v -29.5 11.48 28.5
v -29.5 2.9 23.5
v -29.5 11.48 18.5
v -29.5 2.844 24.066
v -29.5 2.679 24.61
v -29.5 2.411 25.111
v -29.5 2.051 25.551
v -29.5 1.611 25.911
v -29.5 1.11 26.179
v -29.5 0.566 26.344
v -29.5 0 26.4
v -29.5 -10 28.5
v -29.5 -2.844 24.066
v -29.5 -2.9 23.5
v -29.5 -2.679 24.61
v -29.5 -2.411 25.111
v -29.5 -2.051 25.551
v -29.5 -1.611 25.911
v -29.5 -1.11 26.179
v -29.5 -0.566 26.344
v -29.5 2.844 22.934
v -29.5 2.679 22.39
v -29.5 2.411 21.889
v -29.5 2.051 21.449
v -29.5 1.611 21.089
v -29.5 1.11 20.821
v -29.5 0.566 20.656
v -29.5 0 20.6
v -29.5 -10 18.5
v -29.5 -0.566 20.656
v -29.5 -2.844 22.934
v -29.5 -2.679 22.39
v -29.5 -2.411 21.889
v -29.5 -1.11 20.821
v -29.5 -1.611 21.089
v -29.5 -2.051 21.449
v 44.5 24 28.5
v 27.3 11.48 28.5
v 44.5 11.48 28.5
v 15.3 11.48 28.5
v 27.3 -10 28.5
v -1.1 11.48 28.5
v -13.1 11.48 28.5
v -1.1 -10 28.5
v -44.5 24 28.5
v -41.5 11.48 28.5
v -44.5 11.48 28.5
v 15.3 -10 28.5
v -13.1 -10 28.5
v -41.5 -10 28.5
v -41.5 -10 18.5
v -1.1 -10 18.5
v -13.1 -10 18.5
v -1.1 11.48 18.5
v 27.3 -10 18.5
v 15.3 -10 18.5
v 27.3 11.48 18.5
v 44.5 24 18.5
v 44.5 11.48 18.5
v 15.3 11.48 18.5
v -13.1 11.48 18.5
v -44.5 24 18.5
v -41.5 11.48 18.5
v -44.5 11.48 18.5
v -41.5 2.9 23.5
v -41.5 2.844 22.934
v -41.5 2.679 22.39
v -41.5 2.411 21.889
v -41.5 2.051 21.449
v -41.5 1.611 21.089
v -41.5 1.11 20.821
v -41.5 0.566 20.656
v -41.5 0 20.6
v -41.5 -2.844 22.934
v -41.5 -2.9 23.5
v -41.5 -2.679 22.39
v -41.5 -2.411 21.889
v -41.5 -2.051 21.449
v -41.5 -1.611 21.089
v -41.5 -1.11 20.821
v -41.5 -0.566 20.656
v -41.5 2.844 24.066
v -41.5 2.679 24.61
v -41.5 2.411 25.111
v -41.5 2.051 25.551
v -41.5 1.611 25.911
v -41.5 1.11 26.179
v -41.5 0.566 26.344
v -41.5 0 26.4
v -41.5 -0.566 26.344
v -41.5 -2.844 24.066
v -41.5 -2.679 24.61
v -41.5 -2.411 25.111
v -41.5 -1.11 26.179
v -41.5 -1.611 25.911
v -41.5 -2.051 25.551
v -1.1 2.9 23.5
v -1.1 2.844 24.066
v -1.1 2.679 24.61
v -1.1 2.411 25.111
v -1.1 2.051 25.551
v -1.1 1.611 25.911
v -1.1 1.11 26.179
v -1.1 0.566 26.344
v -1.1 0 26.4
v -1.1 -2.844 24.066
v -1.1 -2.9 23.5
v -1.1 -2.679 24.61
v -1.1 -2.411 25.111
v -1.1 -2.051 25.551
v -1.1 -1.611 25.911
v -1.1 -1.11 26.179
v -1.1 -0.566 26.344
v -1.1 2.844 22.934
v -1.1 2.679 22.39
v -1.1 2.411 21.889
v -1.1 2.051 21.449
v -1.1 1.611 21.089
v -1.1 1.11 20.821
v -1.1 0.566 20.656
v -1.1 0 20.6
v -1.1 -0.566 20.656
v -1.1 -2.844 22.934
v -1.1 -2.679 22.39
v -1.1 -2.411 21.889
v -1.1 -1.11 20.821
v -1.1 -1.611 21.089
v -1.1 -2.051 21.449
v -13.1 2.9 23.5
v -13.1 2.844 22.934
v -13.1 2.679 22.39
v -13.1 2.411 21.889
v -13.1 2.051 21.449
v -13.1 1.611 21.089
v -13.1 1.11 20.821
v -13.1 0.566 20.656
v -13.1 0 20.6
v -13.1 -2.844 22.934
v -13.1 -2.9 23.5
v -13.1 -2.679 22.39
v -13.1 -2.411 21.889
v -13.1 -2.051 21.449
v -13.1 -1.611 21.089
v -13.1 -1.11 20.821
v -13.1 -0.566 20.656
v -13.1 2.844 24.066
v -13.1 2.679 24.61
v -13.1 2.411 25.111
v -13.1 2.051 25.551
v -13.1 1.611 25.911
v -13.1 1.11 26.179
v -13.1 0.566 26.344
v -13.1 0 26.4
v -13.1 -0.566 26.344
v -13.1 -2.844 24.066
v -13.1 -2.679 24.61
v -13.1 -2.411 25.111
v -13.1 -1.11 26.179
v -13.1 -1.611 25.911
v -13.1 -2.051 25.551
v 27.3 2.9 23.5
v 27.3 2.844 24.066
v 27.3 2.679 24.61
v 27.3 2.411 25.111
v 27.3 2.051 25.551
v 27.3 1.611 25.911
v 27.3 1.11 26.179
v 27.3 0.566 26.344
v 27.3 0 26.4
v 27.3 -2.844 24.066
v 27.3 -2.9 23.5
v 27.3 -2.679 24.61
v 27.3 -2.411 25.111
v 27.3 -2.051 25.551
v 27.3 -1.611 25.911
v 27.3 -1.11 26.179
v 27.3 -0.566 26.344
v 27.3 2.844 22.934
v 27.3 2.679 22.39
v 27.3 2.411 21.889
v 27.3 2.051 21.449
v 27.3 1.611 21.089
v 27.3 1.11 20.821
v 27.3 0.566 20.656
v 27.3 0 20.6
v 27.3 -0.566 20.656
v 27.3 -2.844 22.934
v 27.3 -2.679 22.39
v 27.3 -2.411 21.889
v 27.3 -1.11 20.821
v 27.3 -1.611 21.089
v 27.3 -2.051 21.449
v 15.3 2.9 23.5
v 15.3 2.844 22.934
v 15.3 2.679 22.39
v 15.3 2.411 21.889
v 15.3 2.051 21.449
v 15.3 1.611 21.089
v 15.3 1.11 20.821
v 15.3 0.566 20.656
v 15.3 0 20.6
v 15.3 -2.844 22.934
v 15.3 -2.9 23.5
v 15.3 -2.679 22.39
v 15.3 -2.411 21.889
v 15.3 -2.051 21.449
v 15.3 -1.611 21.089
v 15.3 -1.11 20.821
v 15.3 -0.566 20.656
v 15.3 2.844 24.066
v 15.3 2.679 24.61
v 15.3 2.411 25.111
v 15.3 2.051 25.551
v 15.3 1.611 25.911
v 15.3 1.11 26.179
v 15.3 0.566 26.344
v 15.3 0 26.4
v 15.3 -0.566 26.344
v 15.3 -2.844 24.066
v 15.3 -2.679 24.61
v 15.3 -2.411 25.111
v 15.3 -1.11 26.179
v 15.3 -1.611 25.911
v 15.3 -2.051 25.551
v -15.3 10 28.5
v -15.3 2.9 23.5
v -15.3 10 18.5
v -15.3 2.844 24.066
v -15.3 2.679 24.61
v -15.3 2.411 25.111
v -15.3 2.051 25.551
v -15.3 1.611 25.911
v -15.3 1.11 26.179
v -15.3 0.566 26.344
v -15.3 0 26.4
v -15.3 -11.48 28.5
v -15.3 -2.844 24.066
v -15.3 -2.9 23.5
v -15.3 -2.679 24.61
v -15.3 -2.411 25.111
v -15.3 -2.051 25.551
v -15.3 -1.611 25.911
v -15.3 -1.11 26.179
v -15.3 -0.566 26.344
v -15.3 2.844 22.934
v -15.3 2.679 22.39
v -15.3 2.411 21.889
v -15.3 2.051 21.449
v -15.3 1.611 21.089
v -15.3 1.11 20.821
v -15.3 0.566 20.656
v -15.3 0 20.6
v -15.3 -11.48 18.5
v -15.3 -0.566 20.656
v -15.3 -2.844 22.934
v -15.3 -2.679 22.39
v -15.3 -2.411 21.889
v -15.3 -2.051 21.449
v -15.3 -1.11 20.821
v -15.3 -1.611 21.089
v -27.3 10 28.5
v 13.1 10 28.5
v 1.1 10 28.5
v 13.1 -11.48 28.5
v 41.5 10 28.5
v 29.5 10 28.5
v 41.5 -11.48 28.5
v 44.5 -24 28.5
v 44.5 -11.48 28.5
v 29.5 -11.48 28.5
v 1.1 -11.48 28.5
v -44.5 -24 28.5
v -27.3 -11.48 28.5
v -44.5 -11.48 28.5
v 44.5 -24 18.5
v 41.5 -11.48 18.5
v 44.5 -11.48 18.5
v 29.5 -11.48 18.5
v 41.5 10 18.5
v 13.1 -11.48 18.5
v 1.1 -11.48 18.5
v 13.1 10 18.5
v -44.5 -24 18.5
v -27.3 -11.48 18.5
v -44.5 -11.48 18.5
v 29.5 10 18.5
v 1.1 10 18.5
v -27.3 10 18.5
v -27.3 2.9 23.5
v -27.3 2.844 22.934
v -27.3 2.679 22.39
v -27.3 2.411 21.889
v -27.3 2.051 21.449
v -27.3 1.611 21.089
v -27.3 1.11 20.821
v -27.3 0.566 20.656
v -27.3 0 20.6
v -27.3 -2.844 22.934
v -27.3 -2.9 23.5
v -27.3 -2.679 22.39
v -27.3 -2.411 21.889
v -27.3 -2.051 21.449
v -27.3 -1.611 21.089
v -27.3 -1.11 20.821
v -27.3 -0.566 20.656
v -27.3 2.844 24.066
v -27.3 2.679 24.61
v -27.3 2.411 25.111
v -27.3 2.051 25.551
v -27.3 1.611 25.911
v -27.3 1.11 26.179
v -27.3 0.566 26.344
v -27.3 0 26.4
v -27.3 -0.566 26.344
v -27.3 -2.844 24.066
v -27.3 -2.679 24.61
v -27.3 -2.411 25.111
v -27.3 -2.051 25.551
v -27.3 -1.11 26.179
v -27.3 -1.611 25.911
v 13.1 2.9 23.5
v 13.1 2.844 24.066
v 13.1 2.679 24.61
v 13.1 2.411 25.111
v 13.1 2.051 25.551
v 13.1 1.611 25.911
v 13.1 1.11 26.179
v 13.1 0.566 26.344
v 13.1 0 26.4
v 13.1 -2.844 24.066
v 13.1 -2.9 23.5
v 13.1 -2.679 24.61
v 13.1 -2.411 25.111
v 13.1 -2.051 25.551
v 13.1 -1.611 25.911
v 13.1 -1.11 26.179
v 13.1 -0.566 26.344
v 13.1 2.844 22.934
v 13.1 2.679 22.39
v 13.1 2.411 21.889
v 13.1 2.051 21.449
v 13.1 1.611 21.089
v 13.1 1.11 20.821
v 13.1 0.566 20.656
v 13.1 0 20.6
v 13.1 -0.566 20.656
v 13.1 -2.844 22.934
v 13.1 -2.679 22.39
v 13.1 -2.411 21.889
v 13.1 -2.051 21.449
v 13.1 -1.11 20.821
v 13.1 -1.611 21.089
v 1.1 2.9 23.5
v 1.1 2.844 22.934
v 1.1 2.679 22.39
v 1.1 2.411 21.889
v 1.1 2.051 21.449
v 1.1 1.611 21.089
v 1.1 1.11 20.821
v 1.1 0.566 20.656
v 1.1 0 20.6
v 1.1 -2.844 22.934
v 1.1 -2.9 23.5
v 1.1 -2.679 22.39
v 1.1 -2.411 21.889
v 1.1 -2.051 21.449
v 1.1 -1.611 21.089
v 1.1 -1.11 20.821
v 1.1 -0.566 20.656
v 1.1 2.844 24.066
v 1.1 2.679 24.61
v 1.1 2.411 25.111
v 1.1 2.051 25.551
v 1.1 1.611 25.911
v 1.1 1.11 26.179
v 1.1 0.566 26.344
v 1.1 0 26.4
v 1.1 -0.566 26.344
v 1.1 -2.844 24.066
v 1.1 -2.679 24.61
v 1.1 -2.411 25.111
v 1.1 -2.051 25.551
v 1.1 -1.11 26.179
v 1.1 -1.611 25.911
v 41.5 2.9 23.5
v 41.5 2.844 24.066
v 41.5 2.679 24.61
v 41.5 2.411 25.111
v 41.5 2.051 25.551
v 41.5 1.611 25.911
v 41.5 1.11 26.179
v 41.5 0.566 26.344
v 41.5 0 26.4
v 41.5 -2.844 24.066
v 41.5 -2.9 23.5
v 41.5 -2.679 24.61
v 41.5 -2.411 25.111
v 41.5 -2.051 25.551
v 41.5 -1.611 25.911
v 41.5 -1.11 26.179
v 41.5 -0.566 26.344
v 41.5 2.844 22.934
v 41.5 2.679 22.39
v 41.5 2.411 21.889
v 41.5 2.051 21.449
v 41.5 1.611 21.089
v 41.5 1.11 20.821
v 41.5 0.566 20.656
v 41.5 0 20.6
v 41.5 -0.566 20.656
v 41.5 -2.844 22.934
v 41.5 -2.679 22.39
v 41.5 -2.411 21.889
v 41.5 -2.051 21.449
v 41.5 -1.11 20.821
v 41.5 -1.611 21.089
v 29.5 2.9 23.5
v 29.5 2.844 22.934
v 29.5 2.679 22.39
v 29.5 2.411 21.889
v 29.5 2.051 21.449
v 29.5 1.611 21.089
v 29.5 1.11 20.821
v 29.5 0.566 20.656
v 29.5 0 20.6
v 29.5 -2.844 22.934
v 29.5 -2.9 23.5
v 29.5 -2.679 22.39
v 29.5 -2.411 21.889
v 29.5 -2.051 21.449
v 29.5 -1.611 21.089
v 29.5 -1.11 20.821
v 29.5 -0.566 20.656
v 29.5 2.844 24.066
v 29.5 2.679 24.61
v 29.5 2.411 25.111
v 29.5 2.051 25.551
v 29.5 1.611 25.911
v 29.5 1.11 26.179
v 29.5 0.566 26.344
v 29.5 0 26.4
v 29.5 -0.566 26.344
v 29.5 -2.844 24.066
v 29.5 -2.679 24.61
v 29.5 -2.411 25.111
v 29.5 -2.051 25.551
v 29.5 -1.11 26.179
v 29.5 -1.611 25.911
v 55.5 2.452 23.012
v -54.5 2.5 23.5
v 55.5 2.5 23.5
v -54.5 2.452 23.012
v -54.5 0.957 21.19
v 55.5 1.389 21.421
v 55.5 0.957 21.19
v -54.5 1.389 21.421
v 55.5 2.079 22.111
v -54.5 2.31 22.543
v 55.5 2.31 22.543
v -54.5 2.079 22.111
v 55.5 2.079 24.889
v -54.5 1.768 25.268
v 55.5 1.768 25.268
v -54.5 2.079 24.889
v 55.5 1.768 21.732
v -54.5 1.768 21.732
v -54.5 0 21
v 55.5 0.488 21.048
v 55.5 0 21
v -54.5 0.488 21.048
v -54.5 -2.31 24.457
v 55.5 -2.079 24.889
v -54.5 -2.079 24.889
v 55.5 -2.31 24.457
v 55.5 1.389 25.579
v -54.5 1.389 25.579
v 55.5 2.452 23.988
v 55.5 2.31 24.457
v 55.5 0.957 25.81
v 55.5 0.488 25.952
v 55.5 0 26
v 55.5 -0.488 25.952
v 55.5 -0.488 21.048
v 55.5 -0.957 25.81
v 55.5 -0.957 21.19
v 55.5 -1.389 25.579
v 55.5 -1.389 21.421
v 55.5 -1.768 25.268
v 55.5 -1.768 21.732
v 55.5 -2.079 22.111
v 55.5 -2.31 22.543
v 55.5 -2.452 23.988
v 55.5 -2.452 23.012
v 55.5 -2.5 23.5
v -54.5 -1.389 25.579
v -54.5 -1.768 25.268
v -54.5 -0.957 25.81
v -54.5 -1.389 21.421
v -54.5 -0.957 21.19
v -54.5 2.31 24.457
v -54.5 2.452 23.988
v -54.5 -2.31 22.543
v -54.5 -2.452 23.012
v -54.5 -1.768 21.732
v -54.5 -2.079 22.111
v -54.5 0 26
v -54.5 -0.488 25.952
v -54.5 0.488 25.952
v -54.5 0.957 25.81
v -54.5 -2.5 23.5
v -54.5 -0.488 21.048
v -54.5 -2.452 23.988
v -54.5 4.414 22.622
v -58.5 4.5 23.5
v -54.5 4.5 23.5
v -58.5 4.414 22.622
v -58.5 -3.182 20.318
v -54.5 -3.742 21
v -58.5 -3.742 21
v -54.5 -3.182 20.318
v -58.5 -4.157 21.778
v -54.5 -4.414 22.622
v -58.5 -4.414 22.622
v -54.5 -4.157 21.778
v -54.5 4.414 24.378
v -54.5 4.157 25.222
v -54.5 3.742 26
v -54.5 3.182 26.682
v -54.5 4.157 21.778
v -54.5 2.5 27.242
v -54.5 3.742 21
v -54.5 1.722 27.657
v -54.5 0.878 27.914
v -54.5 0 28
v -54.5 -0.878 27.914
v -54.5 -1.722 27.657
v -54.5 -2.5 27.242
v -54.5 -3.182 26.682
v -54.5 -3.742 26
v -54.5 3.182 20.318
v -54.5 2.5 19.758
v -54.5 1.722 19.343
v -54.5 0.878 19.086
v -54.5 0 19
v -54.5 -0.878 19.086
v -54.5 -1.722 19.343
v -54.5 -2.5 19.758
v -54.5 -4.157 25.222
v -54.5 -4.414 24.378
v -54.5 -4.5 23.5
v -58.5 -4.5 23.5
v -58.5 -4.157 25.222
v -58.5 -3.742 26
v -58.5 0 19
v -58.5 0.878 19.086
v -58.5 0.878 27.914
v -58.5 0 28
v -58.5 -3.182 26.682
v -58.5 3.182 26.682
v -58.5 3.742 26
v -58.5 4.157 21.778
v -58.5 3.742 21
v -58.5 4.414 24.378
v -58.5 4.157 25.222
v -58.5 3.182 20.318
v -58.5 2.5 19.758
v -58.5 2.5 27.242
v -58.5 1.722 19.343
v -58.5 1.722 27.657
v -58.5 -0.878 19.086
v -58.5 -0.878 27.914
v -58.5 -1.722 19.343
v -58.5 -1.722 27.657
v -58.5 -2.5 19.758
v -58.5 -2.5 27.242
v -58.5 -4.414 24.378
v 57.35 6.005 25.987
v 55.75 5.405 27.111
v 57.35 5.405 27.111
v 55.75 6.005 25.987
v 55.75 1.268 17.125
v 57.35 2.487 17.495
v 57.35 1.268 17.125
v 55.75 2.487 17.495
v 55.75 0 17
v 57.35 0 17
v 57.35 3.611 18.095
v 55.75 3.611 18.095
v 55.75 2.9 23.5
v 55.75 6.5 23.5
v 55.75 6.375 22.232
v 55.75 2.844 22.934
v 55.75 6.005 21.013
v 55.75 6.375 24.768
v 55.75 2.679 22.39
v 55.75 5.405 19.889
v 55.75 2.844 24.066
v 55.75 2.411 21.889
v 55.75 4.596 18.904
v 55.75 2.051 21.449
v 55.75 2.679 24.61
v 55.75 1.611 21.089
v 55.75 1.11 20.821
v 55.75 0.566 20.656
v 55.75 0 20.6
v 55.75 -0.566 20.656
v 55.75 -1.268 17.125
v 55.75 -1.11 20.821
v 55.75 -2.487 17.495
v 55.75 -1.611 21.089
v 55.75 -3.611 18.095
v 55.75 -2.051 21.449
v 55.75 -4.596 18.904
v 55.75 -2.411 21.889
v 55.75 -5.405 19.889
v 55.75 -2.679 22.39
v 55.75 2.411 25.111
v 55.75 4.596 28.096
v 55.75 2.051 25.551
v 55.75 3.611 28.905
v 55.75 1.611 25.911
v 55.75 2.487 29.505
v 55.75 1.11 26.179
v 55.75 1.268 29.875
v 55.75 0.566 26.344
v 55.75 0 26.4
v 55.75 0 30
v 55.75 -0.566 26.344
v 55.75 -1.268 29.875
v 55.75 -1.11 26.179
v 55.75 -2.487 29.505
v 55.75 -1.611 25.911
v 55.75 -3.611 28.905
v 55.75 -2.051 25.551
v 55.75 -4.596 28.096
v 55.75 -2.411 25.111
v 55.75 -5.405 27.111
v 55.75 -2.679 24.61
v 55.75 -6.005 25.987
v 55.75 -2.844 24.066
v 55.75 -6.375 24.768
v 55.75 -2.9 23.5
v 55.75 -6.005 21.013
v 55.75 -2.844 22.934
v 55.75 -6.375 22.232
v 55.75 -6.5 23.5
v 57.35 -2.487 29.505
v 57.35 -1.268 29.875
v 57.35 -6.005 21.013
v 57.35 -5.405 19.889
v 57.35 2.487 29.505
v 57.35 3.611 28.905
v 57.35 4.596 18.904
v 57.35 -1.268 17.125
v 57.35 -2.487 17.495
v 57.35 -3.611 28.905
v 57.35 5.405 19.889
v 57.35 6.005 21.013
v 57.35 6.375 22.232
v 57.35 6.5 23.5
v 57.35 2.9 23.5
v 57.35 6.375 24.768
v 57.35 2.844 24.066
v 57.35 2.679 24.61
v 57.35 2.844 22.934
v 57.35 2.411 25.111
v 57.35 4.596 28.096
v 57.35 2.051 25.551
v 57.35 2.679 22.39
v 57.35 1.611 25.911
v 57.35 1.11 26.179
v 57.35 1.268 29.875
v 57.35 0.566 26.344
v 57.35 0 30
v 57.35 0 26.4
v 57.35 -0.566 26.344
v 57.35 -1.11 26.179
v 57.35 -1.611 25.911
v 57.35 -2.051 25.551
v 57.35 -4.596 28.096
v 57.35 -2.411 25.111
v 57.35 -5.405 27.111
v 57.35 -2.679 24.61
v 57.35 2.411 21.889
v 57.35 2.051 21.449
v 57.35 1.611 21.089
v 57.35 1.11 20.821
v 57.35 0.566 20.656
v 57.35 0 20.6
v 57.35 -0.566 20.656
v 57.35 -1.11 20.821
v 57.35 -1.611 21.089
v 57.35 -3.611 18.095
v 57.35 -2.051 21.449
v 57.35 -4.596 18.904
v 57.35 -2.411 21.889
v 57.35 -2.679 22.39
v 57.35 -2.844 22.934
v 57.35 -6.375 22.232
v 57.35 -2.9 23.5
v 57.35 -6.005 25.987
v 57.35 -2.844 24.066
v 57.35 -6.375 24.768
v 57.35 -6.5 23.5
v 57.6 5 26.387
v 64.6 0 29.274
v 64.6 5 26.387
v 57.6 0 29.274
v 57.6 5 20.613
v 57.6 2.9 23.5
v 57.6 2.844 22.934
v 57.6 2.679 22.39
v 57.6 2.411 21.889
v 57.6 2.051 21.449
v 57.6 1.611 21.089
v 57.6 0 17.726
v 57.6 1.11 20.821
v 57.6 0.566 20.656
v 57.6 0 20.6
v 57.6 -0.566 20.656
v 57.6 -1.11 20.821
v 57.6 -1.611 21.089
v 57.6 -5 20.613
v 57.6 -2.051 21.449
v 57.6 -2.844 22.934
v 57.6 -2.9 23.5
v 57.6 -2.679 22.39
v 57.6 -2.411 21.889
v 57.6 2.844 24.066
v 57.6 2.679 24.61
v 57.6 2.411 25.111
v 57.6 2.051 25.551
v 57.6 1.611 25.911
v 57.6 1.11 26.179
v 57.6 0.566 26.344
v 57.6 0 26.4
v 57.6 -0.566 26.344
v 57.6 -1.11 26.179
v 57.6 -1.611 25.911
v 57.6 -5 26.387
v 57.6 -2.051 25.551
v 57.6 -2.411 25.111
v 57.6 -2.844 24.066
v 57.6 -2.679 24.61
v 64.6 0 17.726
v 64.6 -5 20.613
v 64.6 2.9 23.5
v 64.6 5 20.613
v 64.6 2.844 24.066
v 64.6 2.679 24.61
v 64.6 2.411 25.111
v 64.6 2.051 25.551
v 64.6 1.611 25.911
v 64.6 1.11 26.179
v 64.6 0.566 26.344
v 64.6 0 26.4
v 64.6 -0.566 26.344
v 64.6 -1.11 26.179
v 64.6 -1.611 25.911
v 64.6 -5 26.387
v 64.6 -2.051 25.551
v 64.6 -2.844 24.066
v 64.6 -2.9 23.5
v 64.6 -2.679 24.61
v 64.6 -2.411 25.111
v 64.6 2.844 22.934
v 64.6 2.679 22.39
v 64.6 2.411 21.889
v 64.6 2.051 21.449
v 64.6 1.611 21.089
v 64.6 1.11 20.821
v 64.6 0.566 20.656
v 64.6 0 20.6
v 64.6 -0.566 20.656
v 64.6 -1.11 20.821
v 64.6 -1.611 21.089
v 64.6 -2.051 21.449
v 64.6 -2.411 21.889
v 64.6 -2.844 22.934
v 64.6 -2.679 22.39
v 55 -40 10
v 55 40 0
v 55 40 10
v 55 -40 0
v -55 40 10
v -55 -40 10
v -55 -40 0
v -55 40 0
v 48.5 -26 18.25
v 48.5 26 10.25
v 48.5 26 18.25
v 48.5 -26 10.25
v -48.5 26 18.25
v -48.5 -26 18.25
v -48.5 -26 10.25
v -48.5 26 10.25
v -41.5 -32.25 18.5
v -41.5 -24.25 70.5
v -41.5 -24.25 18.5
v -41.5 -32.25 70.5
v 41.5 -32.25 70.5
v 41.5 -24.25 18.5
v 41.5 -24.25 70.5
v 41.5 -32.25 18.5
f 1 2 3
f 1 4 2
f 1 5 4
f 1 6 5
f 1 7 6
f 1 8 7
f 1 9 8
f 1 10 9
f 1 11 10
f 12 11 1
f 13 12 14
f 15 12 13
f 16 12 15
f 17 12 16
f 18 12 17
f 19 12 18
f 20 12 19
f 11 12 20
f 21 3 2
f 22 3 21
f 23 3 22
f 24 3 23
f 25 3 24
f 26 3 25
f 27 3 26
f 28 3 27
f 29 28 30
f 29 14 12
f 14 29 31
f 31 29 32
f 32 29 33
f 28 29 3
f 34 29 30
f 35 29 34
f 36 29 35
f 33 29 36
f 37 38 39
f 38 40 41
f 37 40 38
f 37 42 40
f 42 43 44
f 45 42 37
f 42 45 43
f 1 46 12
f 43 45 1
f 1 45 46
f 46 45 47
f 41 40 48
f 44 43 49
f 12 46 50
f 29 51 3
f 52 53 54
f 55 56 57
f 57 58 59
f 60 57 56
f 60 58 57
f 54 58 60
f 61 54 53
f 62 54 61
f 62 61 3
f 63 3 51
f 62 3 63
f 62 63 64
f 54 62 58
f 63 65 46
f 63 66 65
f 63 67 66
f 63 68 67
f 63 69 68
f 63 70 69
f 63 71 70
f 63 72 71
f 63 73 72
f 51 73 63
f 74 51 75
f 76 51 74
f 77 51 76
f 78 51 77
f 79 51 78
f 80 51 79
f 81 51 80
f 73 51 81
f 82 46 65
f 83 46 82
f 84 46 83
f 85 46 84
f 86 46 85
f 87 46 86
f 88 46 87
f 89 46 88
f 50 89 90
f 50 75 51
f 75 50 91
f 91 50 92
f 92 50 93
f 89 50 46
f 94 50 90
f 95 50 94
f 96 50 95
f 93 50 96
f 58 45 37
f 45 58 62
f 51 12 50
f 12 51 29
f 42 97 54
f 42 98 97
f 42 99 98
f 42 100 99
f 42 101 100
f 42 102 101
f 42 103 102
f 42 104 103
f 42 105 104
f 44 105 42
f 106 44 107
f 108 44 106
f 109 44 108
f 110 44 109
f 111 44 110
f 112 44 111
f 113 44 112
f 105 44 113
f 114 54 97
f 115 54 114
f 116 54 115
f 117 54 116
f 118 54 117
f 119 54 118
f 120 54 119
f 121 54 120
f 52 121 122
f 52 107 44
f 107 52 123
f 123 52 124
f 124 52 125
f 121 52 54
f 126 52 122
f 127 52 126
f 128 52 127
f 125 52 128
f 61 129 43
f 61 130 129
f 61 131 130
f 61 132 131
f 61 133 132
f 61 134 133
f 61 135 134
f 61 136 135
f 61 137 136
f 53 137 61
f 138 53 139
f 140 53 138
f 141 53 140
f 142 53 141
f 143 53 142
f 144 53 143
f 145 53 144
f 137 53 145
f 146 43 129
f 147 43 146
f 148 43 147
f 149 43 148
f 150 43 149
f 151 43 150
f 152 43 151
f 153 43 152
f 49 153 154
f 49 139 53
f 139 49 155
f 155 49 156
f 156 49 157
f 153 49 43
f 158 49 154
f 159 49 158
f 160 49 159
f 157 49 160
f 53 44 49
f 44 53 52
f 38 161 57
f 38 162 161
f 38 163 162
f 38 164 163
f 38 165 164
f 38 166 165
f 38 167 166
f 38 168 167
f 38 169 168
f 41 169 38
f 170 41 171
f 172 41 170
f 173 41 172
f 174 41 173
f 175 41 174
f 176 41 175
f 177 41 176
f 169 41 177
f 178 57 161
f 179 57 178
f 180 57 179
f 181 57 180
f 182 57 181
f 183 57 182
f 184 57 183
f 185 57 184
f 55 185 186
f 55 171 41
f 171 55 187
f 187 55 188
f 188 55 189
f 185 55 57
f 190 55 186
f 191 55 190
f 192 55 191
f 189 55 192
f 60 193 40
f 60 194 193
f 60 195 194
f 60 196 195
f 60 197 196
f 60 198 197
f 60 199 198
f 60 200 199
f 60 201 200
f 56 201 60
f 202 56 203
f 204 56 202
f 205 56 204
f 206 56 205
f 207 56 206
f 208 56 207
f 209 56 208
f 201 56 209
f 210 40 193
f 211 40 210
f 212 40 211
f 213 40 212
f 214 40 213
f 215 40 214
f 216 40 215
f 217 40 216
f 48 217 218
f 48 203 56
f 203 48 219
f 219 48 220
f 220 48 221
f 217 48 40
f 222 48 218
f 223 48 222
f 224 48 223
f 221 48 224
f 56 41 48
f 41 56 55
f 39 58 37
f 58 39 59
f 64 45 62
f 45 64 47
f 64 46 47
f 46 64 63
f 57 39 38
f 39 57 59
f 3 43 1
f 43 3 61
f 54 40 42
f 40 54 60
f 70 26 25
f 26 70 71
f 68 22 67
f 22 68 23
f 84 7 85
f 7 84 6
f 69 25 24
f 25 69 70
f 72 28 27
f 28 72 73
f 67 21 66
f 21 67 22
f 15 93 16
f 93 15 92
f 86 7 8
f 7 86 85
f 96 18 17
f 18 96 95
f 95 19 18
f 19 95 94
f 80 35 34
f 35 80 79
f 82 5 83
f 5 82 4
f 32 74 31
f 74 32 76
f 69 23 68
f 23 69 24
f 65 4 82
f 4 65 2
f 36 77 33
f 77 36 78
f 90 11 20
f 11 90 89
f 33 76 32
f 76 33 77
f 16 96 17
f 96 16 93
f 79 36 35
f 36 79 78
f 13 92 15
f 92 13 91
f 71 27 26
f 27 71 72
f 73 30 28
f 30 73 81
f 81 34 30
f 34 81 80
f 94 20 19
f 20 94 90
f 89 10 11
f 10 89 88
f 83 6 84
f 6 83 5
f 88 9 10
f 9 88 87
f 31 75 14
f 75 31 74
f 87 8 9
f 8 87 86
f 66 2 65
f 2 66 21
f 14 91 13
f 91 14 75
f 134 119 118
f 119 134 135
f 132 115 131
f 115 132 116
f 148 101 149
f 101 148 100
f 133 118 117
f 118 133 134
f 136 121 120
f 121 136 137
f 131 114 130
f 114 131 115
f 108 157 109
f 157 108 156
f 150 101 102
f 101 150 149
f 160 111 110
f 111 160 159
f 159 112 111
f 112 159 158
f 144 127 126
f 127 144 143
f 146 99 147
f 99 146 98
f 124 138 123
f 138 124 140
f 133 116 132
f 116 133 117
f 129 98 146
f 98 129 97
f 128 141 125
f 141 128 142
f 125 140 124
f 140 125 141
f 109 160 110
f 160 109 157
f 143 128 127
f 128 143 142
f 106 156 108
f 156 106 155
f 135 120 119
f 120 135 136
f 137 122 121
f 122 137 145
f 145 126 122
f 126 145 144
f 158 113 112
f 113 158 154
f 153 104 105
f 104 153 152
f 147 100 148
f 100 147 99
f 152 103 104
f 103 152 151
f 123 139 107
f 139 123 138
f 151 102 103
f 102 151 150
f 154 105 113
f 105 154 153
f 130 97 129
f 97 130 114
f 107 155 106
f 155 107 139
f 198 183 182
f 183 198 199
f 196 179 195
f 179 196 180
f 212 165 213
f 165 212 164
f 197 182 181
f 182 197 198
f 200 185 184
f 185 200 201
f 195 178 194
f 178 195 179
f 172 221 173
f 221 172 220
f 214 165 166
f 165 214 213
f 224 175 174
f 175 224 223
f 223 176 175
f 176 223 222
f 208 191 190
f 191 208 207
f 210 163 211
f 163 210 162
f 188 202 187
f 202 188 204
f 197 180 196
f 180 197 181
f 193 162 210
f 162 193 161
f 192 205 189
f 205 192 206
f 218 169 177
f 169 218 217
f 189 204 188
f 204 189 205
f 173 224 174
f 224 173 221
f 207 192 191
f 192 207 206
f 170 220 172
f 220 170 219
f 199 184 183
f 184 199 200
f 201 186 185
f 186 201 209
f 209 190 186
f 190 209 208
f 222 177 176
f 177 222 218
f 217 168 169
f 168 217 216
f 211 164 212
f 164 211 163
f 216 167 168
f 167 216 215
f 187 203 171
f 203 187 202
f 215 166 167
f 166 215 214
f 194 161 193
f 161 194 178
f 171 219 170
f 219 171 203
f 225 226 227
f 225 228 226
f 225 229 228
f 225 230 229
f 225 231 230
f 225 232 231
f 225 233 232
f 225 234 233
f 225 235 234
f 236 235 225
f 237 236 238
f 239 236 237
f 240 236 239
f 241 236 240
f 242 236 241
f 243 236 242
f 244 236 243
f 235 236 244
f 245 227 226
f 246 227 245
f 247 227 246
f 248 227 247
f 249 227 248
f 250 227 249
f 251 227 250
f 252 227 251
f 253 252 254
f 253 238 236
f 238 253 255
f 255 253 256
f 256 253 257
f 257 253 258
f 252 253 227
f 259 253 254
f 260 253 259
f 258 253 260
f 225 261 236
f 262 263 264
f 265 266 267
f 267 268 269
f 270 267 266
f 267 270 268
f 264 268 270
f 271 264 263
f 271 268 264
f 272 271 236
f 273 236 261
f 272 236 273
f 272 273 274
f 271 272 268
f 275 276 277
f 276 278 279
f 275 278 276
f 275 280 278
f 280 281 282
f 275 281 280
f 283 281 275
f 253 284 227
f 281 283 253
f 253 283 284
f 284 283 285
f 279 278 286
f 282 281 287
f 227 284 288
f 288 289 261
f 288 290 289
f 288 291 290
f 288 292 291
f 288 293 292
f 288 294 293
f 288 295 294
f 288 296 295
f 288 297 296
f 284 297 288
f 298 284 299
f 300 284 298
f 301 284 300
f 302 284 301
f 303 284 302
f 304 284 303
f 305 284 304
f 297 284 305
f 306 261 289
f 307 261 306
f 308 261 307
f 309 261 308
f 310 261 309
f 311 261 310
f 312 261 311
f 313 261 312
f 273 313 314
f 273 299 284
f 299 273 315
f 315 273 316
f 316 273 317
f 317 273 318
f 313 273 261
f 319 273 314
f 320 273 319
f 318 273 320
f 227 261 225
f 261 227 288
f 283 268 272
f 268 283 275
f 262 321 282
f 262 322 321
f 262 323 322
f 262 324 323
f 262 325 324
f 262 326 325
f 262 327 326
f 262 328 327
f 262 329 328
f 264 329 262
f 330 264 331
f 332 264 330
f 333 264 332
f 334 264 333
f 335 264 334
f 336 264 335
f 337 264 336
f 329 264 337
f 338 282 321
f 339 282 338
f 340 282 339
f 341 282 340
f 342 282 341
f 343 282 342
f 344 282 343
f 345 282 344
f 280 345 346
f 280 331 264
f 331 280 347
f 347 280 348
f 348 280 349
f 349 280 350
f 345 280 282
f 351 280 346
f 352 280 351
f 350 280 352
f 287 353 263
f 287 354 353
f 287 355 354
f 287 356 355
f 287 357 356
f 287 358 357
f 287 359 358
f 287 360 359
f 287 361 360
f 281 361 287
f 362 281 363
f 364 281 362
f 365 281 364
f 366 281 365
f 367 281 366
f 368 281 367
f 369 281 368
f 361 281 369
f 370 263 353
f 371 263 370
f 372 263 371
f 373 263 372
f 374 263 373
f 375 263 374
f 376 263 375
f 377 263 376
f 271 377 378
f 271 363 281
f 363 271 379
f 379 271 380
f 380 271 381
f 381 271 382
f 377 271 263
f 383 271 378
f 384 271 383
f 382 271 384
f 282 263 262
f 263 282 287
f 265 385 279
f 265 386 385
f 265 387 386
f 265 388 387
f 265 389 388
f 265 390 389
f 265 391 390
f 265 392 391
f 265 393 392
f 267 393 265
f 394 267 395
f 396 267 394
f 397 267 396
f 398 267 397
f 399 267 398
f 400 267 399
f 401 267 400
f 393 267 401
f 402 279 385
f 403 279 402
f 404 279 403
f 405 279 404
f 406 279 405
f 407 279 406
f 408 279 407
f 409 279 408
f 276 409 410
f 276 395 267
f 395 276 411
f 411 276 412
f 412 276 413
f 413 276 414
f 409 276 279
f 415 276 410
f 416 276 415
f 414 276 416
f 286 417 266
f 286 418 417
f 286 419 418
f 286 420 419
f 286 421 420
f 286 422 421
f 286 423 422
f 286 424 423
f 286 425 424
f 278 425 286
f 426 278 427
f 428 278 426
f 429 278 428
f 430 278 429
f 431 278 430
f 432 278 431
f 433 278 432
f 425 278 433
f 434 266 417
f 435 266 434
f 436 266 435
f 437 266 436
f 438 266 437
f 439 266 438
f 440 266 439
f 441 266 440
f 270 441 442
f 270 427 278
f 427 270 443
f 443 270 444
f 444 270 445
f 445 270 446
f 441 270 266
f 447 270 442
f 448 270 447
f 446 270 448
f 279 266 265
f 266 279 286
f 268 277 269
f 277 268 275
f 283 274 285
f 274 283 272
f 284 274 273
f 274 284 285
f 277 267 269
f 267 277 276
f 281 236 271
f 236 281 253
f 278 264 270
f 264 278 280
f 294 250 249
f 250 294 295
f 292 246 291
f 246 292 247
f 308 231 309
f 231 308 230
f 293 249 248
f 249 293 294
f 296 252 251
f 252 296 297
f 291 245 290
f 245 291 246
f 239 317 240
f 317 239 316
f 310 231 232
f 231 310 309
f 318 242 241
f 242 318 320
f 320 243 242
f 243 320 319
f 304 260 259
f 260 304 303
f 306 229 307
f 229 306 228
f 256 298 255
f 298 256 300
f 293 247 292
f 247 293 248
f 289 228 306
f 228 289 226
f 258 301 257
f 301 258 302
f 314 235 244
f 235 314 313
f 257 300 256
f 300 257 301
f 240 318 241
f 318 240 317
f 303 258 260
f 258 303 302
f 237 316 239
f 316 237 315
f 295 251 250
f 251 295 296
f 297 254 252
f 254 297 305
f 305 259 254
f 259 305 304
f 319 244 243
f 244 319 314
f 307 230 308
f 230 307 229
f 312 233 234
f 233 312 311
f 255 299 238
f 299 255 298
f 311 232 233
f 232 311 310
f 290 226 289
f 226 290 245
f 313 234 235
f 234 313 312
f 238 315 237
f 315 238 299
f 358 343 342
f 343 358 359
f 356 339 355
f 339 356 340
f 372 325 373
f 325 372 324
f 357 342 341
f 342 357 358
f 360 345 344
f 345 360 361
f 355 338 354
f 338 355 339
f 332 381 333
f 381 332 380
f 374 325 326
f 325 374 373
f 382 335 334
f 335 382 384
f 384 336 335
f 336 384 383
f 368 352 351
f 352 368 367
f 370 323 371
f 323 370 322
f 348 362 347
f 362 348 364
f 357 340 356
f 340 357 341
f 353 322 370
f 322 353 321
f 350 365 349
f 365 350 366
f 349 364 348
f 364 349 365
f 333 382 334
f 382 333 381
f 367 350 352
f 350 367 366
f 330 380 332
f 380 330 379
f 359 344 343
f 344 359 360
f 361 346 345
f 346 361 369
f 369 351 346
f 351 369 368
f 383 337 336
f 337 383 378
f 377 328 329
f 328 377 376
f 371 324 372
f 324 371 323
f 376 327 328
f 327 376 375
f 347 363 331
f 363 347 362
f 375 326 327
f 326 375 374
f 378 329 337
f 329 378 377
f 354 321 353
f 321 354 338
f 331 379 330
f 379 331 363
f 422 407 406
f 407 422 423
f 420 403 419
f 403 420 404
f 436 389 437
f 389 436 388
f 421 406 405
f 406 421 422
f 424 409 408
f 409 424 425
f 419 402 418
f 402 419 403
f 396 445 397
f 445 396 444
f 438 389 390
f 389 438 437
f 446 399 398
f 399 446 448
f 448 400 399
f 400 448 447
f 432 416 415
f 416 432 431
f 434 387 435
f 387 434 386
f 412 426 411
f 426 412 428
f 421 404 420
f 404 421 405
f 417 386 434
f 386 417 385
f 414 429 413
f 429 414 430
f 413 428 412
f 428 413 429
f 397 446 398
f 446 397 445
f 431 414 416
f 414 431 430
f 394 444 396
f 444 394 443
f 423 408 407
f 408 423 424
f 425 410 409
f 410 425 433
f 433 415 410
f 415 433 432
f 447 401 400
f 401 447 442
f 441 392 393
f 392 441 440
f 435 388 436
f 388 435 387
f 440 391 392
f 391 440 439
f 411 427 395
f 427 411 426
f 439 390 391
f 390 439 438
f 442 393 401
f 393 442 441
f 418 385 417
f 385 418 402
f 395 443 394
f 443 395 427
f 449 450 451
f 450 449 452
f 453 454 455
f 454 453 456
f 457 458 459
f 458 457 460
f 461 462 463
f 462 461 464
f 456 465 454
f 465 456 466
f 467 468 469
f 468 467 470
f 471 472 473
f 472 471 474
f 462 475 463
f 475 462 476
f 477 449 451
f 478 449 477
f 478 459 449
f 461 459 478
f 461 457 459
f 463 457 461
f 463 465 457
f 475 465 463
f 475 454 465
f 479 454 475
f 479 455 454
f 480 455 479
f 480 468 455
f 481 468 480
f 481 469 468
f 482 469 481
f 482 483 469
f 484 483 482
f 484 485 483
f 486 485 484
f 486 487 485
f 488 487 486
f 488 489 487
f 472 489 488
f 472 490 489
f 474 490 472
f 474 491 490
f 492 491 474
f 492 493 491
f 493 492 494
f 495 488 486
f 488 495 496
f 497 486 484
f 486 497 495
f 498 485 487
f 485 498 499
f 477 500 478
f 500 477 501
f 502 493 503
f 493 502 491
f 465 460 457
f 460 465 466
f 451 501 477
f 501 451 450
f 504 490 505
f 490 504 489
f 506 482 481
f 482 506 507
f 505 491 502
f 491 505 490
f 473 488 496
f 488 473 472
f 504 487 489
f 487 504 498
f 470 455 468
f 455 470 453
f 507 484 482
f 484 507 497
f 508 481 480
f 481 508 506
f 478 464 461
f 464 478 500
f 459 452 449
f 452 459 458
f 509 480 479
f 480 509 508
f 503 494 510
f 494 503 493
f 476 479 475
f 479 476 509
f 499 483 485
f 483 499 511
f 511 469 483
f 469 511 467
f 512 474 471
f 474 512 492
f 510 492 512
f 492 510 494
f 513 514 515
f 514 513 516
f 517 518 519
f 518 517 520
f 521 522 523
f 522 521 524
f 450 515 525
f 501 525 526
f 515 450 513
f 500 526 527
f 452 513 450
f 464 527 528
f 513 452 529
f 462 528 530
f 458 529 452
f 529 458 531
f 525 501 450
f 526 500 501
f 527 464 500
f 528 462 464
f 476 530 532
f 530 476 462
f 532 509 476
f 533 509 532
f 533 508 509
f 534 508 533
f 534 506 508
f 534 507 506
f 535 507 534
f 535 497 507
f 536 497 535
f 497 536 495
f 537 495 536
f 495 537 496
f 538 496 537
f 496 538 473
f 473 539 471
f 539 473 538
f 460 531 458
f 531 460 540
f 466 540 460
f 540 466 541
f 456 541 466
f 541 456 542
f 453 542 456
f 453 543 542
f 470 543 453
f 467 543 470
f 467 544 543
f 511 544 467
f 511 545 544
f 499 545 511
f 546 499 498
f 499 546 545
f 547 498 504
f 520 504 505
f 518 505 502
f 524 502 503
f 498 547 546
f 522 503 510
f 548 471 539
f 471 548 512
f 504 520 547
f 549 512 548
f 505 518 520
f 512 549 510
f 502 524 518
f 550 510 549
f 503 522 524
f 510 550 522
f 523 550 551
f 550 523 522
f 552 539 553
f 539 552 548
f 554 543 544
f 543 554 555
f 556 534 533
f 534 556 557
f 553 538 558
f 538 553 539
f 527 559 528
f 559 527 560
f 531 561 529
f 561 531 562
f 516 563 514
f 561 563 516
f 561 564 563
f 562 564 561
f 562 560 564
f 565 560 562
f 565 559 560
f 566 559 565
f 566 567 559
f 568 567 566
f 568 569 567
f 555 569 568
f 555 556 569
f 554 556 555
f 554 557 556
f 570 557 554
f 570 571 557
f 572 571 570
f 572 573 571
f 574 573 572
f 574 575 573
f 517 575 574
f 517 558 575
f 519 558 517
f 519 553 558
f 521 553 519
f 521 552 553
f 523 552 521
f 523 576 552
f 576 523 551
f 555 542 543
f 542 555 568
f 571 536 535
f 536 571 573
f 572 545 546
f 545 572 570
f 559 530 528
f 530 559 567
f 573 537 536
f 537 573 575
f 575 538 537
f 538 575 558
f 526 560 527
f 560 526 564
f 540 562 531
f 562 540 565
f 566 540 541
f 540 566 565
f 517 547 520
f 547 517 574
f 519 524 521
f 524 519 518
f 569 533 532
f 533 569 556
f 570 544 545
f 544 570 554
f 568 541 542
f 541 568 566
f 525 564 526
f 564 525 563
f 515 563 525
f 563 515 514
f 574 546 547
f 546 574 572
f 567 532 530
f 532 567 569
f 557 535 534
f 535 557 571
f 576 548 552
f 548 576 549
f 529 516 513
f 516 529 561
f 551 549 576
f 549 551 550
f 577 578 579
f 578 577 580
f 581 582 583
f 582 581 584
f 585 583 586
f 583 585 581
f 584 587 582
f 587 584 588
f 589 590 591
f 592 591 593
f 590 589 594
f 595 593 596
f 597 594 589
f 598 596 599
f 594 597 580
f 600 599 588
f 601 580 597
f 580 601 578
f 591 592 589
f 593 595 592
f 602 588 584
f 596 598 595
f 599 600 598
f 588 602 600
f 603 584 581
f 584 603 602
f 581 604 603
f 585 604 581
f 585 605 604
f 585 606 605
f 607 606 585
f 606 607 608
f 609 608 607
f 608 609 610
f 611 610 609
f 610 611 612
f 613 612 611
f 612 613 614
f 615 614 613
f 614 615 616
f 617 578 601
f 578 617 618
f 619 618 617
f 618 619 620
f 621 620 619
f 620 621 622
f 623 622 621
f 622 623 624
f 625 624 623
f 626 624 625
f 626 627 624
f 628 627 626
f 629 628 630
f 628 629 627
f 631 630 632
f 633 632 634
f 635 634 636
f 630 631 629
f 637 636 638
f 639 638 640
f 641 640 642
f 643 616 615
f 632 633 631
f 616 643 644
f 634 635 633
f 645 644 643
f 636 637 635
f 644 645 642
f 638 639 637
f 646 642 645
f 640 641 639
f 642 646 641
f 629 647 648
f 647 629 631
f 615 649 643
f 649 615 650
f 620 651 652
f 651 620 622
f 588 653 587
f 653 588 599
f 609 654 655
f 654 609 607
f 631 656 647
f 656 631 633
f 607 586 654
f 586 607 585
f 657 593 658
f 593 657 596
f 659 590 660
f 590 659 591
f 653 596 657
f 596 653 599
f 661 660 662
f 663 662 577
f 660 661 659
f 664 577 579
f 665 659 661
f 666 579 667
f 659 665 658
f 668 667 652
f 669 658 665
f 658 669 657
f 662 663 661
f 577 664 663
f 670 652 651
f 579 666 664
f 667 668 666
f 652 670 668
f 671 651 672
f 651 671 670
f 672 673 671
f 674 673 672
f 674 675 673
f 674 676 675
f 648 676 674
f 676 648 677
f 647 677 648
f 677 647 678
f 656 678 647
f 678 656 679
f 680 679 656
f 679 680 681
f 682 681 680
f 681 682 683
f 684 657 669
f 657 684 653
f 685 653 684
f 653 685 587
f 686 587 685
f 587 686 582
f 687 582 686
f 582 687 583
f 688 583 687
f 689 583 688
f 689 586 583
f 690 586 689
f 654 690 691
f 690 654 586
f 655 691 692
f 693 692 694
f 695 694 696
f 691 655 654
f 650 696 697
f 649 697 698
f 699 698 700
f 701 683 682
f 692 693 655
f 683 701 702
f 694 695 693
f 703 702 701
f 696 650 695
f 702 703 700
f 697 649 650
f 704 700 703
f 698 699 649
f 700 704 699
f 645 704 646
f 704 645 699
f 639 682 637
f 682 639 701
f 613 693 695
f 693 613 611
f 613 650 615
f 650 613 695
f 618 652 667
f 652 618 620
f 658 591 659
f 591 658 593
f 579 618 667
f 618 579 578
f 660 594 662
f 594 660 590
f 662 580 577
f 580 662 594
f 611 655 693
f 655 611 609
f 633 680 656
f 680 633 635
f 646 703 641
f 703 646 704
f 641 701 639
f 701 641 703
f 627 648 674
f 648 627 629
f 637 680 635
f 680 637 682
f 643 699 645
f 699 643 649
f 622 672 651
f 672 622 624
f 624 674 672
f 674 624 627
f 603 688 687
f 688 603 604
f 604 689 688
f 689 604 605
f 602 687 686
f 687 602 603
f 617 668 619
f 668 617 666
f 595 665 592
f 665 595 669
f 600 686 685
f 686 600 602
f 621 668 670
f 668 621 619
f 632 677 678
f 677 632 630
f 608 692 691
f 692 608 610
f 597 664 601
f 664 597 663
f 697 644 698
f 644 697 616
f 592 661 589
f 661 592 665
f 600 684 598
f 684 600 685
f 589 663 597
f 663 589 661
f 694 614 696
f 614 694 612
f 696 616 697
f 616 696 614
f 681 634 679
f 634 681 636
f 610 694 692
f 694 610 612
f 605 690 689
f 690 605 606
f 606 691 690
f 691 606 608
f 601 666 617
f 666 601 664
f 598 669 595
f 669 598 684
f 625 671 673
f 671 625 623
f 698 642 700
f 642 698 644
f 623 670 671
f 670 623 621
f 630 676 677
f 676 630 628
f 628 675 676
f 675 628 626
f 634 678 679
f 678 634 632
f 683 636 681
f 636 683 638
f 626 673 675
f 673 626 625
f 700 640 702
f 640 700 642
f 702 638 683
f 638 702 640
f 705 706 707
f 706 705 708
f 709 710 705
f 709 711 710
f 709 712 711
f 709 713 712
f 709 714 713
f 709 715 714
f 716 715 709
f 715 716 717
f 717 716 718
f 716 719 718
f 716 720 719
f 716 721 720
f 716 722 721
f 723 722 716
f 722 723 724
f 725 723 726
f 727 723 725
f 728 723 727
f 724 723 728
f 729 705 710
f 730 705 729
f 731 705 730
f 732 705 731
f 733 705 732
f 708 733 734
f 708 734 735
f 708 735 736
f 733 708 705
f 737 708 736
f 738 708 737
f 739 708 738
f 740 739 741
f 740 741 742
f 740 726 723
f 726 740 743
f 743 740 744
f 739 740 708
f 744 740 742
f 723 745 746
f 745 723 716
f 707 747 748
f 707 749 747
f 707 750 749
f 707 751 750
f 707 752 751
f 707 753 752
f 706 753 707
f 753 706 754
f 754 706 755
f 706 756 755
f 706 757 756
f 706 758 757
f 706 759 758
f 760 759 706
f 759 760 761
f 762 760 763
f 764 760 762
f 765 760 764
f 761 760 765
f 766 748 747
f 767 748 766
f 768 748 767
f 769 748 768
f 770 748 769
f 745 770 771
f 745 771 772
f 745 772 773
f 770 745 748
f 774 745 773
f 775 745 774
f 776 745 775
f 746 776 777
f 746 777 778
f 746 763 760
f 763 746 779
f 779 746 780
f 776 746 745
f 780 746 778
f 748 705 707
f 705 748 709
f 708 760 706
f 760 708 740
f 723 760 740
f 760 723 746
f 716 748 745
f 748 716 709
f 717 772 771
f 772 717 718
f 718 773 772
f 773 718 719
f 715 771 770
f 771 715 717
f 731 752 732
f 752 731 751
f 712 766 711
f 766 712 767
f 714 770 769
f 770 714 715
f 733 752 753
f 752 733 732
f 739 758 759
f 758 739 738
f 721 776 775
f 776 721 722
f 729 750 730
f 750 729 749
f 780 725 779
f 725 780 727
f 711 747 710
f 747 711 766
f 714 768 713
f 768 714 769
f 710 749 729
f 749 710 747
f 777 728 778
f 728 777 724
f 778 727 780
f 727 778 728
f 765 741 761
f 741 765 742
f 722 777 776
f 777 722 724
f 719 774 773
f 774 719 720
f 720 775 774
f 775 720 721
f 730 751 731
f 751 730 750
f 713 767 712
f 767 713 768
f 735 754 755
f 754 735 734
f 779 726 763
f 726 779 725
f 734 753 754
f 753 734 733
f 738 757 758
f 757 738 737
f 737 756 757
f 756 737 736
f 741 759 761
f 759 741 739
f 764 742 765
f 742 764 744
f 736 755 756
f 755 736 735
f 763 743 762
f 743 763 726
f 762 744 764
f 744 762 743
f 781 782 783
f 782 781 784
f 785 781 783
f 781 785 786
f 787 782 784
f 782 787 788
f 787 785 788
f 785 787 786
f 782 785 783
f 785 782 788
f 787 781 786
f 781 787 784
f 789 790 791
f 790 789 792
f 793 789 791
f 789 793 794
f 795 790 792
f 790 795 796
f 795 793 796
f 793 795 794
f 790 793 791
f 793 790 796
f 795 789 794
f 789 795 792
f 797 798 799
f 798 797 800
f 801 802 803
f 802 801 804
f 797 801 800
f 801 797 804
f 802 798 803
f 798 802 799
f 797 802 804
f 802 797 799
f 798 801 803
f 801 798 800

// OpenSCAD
$fn = 32;

// ------------------------------------------------------------------------
// Comb hinge with flap: leaf 89 x 24 mm, pin d5, flap 52 mm
// Every part is its own module, assembly() places every instance.
// ------------------------------------------------------------------------

// --- part 1 ---
module hinge_bed() {
  difference() {
    translate([-55, -40, 0]) cube([110, 80, 10]);
  }
}

// --- part 2 ---
module hinge_riser() {
  difference() {
    translate([-48.5, -26, 0]) cube([97, 52, 8]);
  }
}

// --- part 3 ---
module hinge_leaf_a() {
  difference() {
    union() {
      translate([-41.5, -10, -5]) cube([12, 34, 10]);
      translate([-13.1, -10, -5]) cube([12, 34, 10]);
      translate([15.3, -10, -5]) cube([12, 34, 10]);
      translate([-44.5, 11.48, -5]) cube([89, 12.52, 10]);
    }
    translate([-35.5, 0, 0]) rotate([0, 90, 0]) cylinder(h = 14, d = 5.8, center = true);
    translate([-7.1, 0, 0]) rotate([0, 90, 0]) cylinder(h = 14, d = 5.8, center = true);
    translate([21.3, 0, 0]) rotate([0, 90, 0]) cylinder(h = 14, d = 5.8, center = true);
  }
}

// --- part 4 ---
module hinge_leaf_b() {
  difference() {
    union() {
      translate([-27.3, -24, -5]) cube([12, 34, 10]);
      translate([1.1, -24, -5]) cube([12, 34, 10]);
      translate([29.5, -24, -5]) cube([12, 34, 10]);
      translate([-44.5, -24, -5]) cube([89, 12.52, 10]);
    }
    translate([-21.3, 0, 0]) rotate([0, 90, 0]) cylinder(h = 14, d = 5.8, center = true);
    translate([7.1, 0, 0]) rotate([0, 90, 0]) cylinder(h = 14, d = 5.8, center = true);
    translate([35.5, 0, 0]) rotate([0, 90, 0]) cylinder(h = 14, d = 5.8, center = true);
  }
}

// --- part 5 ---
module hinge_flap() {
  difference() {
    translate([-41.5, -26, 0]) cube([83, 52, 8]);
  }
}

// --- part 6 ---
module hinge_pin() {
  rotate([0, 90, 0]) cylinder(h = 111, d = 5, center = true);
  translate([-58.5, 0, 0]) rotate([0, 90, 0]) cylinder(h = 4, d = 9);
}

// --- part 7 ---
module pin_washer() {
  difference() {
      translate([0, 0, 0]) cylinder(h = 1.6, d = 13);
      translate([0, 0, -1]) cylinder(h = 3.6, d = 5.8);
    }
}

// --- part 8 ---
module pin_nut() {
  difference() {
    linear_extrude(height = 7) polygon(points = [[5.774, 0], [2.887, 5], [-2.887, 5], [-5.774, 0], [-2.887, -5], [2.887, -5]]);
    translate([0, 0, -1]) cylinder(h = 9, d = 5.8);
  }
}

// --- assembly ---
module assembly() {
  color([0.80, 0.24, 0.20]) translate([0, 0, 0]) rotate([0, 0, 0]) hinge_bed();
  color([0.20, 0.45, 0.75]) translate([0, 0, 10.25]) rotate([0, 0, 0]) hinge_riser();
  color([0.25, 0.62, 0.32]) translate([0, 0, 23.5]) rotate([0, 0, 0]) hinge_leaf_a();
  color([0.92, 0.70, 0.18]) translate([0, 0, 23.5]) rotate([0, 0, 0]) hinge_leaf_b();
  color([0.58, 0.35, 0.70]) translate([0, -24.25, 44.5]) rotate([90, 0, 0]) hinge_flap();
  color([0.16, 0.66, 0.66]) translate([0, 0, 23.5]) rotate([0, 0, 0]) hinge_pin();
  color([0.85, 0.48, 0.18]) translate([55.75, 0, 23.5]) rotate([0, 90, 0]) pin_washer();
  color([0.55, 0.60, 0.65]) translate([57.6, 0, 23.5]) rotate([0, 90, 0]) pin_nut();
}

assembly();
